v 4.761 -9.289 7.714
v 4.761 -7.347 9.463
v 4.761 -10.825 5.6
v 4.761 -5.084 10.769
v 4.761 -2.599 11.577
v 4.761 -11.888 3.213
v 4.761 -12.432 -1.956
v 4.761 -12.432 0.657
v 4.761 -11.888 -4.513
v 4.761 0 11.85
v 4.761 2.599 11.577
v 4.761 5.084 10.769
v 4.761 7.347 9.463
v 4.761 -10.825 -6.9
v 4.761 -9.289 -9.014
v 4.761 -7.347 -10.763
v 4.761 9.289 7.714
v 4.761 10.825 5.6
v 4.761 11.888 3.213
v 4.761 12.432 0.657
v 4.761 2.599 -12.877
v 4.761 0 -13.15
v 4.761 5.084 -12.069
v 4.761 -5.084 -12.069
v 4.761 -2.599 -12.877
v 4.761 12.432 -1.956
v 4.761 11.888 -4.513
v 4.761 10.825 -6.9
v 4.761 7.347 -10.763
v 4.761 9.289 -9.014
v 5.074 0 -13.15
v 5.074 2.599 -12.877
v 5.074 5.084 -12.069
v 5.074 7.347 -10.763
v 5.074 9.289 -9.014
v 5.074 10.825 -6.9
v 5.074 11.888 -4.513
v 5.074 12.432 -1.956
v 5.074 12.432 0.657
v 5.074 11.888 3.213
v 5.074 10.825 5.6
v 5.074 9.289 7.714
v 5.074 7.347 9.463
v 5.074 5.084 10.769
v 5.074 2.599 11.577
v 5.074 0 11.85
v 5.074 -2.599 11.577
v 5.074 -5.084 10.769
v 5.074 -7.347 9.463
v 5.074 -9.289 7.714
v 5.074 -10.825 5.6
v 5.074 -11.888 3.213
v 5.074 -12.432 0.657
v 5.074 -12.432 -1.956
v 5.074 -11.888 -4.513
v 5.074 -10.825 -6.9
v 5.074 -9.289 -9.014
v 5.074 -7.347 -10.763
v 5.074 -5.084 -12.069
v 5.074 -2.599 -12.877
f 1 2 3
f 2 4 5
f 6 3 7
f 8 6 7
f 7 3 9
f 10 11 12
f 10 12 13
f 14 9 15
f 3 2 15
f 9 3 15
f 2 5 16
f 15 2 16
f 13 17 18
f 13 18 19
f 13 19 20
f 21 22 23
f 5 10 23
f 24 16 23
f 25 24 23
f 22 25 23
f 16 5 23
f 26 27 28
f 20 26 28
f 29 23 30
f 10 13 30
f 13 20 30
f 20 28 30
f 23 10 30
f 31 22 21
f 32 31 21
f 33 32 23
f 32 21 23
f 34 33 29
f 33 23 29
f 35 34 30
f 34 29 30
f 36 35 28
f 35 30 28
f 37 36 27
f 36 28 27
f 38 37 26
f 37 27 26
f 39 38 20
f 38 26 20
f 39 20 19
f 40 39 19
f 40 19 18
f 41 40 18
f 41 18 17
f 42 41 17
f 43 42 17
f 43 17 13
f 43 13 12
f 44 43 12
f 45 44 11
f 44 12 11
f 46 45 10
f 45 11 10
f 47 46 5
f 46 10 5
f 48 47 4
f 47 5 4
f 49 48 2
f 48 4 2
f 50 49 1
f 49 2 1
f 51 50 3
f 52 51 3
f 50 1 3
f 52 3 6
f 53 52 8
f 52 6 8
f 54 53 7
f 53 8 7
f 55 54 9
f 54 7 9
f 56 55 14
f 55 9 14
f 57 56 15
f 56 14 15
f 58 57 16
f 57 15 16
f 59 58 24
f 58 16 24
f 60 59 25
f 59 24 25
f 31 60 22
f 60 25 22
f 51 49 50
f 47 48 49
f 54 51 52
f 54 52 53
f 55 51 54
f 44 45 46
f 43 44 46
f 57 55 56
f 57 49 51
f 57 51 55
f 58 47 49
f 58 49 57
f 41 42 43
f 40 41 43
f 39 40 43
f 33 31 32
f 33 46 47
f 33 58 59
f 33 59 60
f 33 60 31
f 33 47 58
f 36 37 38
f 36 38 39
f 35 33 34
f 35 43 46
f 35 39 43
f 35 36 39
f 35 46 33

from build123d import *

# Parameters (mm, degrees)
SKETCH1_R             = 40
BOSS_EXTRUDE1_DEPTH   = 1
SCALE1_SCALE          = 0.5
SCALE3_SCALE          = 0.625
BODY_MOVE_COPY4_ANGLE = 30
BODY_MOVE_COPY5_ANGLE = 30


with BuildPart() as part:
    # Sketch1 → Boss-Extrude1 (new body)
    with BuildSketch(Plane(origin=(0, 0, 0), x_dir=(0, 0, -1), z_dir=(1, 0, 0))):
        Circle(SKETCH1_R)
    extrude(amount=BOSS_EXTRUDE1_DEPTH)


with BuildPart() as part_1:
    # Scale1: scaled about (0.5, 0, 0)
    add(part.part.scale(SCALE1_SCALE).moved(Location((0.25, 0, 0))))


with BuildPart() as part_2:
    # Body-Move/Copy2: moved
    add(part_1.part.moved(Location((4.171055646, 0, 0))))


with BuildPart() as part_3:
    # Scale3: scaled about (4.671055646, 0, 0)
    add(part_2.part.scale(SCALE3_SCALE).moved(Location((1.751645867, 0, 0))))


with BuildPart() as part_4:
    # Body-Move/Copy4: read off the stored shape, not the designer's step
    # Body-Move/Copy4: moved
    add(part_3.part.moved(Location((-0.8605566, 0, -3.1693539))).rotate(Axis((0, 0, 0), (0, -1, 0)), BODY_MOVE_COPY4_ANGLE))


with BuildPart() as part_5:
    # Body-Move/Copy5: read off the stored shape, not the designer's step
    # Body-Move/Copy5: moved
    add(part_4.part.moved(Location((-0.3011634, 0, 2.7353489))).rotate(Axis((0, 0, 0), (0, 1, 0)), BODY_MOVE_COPY5_ANGLE))


solid = part_5.part
